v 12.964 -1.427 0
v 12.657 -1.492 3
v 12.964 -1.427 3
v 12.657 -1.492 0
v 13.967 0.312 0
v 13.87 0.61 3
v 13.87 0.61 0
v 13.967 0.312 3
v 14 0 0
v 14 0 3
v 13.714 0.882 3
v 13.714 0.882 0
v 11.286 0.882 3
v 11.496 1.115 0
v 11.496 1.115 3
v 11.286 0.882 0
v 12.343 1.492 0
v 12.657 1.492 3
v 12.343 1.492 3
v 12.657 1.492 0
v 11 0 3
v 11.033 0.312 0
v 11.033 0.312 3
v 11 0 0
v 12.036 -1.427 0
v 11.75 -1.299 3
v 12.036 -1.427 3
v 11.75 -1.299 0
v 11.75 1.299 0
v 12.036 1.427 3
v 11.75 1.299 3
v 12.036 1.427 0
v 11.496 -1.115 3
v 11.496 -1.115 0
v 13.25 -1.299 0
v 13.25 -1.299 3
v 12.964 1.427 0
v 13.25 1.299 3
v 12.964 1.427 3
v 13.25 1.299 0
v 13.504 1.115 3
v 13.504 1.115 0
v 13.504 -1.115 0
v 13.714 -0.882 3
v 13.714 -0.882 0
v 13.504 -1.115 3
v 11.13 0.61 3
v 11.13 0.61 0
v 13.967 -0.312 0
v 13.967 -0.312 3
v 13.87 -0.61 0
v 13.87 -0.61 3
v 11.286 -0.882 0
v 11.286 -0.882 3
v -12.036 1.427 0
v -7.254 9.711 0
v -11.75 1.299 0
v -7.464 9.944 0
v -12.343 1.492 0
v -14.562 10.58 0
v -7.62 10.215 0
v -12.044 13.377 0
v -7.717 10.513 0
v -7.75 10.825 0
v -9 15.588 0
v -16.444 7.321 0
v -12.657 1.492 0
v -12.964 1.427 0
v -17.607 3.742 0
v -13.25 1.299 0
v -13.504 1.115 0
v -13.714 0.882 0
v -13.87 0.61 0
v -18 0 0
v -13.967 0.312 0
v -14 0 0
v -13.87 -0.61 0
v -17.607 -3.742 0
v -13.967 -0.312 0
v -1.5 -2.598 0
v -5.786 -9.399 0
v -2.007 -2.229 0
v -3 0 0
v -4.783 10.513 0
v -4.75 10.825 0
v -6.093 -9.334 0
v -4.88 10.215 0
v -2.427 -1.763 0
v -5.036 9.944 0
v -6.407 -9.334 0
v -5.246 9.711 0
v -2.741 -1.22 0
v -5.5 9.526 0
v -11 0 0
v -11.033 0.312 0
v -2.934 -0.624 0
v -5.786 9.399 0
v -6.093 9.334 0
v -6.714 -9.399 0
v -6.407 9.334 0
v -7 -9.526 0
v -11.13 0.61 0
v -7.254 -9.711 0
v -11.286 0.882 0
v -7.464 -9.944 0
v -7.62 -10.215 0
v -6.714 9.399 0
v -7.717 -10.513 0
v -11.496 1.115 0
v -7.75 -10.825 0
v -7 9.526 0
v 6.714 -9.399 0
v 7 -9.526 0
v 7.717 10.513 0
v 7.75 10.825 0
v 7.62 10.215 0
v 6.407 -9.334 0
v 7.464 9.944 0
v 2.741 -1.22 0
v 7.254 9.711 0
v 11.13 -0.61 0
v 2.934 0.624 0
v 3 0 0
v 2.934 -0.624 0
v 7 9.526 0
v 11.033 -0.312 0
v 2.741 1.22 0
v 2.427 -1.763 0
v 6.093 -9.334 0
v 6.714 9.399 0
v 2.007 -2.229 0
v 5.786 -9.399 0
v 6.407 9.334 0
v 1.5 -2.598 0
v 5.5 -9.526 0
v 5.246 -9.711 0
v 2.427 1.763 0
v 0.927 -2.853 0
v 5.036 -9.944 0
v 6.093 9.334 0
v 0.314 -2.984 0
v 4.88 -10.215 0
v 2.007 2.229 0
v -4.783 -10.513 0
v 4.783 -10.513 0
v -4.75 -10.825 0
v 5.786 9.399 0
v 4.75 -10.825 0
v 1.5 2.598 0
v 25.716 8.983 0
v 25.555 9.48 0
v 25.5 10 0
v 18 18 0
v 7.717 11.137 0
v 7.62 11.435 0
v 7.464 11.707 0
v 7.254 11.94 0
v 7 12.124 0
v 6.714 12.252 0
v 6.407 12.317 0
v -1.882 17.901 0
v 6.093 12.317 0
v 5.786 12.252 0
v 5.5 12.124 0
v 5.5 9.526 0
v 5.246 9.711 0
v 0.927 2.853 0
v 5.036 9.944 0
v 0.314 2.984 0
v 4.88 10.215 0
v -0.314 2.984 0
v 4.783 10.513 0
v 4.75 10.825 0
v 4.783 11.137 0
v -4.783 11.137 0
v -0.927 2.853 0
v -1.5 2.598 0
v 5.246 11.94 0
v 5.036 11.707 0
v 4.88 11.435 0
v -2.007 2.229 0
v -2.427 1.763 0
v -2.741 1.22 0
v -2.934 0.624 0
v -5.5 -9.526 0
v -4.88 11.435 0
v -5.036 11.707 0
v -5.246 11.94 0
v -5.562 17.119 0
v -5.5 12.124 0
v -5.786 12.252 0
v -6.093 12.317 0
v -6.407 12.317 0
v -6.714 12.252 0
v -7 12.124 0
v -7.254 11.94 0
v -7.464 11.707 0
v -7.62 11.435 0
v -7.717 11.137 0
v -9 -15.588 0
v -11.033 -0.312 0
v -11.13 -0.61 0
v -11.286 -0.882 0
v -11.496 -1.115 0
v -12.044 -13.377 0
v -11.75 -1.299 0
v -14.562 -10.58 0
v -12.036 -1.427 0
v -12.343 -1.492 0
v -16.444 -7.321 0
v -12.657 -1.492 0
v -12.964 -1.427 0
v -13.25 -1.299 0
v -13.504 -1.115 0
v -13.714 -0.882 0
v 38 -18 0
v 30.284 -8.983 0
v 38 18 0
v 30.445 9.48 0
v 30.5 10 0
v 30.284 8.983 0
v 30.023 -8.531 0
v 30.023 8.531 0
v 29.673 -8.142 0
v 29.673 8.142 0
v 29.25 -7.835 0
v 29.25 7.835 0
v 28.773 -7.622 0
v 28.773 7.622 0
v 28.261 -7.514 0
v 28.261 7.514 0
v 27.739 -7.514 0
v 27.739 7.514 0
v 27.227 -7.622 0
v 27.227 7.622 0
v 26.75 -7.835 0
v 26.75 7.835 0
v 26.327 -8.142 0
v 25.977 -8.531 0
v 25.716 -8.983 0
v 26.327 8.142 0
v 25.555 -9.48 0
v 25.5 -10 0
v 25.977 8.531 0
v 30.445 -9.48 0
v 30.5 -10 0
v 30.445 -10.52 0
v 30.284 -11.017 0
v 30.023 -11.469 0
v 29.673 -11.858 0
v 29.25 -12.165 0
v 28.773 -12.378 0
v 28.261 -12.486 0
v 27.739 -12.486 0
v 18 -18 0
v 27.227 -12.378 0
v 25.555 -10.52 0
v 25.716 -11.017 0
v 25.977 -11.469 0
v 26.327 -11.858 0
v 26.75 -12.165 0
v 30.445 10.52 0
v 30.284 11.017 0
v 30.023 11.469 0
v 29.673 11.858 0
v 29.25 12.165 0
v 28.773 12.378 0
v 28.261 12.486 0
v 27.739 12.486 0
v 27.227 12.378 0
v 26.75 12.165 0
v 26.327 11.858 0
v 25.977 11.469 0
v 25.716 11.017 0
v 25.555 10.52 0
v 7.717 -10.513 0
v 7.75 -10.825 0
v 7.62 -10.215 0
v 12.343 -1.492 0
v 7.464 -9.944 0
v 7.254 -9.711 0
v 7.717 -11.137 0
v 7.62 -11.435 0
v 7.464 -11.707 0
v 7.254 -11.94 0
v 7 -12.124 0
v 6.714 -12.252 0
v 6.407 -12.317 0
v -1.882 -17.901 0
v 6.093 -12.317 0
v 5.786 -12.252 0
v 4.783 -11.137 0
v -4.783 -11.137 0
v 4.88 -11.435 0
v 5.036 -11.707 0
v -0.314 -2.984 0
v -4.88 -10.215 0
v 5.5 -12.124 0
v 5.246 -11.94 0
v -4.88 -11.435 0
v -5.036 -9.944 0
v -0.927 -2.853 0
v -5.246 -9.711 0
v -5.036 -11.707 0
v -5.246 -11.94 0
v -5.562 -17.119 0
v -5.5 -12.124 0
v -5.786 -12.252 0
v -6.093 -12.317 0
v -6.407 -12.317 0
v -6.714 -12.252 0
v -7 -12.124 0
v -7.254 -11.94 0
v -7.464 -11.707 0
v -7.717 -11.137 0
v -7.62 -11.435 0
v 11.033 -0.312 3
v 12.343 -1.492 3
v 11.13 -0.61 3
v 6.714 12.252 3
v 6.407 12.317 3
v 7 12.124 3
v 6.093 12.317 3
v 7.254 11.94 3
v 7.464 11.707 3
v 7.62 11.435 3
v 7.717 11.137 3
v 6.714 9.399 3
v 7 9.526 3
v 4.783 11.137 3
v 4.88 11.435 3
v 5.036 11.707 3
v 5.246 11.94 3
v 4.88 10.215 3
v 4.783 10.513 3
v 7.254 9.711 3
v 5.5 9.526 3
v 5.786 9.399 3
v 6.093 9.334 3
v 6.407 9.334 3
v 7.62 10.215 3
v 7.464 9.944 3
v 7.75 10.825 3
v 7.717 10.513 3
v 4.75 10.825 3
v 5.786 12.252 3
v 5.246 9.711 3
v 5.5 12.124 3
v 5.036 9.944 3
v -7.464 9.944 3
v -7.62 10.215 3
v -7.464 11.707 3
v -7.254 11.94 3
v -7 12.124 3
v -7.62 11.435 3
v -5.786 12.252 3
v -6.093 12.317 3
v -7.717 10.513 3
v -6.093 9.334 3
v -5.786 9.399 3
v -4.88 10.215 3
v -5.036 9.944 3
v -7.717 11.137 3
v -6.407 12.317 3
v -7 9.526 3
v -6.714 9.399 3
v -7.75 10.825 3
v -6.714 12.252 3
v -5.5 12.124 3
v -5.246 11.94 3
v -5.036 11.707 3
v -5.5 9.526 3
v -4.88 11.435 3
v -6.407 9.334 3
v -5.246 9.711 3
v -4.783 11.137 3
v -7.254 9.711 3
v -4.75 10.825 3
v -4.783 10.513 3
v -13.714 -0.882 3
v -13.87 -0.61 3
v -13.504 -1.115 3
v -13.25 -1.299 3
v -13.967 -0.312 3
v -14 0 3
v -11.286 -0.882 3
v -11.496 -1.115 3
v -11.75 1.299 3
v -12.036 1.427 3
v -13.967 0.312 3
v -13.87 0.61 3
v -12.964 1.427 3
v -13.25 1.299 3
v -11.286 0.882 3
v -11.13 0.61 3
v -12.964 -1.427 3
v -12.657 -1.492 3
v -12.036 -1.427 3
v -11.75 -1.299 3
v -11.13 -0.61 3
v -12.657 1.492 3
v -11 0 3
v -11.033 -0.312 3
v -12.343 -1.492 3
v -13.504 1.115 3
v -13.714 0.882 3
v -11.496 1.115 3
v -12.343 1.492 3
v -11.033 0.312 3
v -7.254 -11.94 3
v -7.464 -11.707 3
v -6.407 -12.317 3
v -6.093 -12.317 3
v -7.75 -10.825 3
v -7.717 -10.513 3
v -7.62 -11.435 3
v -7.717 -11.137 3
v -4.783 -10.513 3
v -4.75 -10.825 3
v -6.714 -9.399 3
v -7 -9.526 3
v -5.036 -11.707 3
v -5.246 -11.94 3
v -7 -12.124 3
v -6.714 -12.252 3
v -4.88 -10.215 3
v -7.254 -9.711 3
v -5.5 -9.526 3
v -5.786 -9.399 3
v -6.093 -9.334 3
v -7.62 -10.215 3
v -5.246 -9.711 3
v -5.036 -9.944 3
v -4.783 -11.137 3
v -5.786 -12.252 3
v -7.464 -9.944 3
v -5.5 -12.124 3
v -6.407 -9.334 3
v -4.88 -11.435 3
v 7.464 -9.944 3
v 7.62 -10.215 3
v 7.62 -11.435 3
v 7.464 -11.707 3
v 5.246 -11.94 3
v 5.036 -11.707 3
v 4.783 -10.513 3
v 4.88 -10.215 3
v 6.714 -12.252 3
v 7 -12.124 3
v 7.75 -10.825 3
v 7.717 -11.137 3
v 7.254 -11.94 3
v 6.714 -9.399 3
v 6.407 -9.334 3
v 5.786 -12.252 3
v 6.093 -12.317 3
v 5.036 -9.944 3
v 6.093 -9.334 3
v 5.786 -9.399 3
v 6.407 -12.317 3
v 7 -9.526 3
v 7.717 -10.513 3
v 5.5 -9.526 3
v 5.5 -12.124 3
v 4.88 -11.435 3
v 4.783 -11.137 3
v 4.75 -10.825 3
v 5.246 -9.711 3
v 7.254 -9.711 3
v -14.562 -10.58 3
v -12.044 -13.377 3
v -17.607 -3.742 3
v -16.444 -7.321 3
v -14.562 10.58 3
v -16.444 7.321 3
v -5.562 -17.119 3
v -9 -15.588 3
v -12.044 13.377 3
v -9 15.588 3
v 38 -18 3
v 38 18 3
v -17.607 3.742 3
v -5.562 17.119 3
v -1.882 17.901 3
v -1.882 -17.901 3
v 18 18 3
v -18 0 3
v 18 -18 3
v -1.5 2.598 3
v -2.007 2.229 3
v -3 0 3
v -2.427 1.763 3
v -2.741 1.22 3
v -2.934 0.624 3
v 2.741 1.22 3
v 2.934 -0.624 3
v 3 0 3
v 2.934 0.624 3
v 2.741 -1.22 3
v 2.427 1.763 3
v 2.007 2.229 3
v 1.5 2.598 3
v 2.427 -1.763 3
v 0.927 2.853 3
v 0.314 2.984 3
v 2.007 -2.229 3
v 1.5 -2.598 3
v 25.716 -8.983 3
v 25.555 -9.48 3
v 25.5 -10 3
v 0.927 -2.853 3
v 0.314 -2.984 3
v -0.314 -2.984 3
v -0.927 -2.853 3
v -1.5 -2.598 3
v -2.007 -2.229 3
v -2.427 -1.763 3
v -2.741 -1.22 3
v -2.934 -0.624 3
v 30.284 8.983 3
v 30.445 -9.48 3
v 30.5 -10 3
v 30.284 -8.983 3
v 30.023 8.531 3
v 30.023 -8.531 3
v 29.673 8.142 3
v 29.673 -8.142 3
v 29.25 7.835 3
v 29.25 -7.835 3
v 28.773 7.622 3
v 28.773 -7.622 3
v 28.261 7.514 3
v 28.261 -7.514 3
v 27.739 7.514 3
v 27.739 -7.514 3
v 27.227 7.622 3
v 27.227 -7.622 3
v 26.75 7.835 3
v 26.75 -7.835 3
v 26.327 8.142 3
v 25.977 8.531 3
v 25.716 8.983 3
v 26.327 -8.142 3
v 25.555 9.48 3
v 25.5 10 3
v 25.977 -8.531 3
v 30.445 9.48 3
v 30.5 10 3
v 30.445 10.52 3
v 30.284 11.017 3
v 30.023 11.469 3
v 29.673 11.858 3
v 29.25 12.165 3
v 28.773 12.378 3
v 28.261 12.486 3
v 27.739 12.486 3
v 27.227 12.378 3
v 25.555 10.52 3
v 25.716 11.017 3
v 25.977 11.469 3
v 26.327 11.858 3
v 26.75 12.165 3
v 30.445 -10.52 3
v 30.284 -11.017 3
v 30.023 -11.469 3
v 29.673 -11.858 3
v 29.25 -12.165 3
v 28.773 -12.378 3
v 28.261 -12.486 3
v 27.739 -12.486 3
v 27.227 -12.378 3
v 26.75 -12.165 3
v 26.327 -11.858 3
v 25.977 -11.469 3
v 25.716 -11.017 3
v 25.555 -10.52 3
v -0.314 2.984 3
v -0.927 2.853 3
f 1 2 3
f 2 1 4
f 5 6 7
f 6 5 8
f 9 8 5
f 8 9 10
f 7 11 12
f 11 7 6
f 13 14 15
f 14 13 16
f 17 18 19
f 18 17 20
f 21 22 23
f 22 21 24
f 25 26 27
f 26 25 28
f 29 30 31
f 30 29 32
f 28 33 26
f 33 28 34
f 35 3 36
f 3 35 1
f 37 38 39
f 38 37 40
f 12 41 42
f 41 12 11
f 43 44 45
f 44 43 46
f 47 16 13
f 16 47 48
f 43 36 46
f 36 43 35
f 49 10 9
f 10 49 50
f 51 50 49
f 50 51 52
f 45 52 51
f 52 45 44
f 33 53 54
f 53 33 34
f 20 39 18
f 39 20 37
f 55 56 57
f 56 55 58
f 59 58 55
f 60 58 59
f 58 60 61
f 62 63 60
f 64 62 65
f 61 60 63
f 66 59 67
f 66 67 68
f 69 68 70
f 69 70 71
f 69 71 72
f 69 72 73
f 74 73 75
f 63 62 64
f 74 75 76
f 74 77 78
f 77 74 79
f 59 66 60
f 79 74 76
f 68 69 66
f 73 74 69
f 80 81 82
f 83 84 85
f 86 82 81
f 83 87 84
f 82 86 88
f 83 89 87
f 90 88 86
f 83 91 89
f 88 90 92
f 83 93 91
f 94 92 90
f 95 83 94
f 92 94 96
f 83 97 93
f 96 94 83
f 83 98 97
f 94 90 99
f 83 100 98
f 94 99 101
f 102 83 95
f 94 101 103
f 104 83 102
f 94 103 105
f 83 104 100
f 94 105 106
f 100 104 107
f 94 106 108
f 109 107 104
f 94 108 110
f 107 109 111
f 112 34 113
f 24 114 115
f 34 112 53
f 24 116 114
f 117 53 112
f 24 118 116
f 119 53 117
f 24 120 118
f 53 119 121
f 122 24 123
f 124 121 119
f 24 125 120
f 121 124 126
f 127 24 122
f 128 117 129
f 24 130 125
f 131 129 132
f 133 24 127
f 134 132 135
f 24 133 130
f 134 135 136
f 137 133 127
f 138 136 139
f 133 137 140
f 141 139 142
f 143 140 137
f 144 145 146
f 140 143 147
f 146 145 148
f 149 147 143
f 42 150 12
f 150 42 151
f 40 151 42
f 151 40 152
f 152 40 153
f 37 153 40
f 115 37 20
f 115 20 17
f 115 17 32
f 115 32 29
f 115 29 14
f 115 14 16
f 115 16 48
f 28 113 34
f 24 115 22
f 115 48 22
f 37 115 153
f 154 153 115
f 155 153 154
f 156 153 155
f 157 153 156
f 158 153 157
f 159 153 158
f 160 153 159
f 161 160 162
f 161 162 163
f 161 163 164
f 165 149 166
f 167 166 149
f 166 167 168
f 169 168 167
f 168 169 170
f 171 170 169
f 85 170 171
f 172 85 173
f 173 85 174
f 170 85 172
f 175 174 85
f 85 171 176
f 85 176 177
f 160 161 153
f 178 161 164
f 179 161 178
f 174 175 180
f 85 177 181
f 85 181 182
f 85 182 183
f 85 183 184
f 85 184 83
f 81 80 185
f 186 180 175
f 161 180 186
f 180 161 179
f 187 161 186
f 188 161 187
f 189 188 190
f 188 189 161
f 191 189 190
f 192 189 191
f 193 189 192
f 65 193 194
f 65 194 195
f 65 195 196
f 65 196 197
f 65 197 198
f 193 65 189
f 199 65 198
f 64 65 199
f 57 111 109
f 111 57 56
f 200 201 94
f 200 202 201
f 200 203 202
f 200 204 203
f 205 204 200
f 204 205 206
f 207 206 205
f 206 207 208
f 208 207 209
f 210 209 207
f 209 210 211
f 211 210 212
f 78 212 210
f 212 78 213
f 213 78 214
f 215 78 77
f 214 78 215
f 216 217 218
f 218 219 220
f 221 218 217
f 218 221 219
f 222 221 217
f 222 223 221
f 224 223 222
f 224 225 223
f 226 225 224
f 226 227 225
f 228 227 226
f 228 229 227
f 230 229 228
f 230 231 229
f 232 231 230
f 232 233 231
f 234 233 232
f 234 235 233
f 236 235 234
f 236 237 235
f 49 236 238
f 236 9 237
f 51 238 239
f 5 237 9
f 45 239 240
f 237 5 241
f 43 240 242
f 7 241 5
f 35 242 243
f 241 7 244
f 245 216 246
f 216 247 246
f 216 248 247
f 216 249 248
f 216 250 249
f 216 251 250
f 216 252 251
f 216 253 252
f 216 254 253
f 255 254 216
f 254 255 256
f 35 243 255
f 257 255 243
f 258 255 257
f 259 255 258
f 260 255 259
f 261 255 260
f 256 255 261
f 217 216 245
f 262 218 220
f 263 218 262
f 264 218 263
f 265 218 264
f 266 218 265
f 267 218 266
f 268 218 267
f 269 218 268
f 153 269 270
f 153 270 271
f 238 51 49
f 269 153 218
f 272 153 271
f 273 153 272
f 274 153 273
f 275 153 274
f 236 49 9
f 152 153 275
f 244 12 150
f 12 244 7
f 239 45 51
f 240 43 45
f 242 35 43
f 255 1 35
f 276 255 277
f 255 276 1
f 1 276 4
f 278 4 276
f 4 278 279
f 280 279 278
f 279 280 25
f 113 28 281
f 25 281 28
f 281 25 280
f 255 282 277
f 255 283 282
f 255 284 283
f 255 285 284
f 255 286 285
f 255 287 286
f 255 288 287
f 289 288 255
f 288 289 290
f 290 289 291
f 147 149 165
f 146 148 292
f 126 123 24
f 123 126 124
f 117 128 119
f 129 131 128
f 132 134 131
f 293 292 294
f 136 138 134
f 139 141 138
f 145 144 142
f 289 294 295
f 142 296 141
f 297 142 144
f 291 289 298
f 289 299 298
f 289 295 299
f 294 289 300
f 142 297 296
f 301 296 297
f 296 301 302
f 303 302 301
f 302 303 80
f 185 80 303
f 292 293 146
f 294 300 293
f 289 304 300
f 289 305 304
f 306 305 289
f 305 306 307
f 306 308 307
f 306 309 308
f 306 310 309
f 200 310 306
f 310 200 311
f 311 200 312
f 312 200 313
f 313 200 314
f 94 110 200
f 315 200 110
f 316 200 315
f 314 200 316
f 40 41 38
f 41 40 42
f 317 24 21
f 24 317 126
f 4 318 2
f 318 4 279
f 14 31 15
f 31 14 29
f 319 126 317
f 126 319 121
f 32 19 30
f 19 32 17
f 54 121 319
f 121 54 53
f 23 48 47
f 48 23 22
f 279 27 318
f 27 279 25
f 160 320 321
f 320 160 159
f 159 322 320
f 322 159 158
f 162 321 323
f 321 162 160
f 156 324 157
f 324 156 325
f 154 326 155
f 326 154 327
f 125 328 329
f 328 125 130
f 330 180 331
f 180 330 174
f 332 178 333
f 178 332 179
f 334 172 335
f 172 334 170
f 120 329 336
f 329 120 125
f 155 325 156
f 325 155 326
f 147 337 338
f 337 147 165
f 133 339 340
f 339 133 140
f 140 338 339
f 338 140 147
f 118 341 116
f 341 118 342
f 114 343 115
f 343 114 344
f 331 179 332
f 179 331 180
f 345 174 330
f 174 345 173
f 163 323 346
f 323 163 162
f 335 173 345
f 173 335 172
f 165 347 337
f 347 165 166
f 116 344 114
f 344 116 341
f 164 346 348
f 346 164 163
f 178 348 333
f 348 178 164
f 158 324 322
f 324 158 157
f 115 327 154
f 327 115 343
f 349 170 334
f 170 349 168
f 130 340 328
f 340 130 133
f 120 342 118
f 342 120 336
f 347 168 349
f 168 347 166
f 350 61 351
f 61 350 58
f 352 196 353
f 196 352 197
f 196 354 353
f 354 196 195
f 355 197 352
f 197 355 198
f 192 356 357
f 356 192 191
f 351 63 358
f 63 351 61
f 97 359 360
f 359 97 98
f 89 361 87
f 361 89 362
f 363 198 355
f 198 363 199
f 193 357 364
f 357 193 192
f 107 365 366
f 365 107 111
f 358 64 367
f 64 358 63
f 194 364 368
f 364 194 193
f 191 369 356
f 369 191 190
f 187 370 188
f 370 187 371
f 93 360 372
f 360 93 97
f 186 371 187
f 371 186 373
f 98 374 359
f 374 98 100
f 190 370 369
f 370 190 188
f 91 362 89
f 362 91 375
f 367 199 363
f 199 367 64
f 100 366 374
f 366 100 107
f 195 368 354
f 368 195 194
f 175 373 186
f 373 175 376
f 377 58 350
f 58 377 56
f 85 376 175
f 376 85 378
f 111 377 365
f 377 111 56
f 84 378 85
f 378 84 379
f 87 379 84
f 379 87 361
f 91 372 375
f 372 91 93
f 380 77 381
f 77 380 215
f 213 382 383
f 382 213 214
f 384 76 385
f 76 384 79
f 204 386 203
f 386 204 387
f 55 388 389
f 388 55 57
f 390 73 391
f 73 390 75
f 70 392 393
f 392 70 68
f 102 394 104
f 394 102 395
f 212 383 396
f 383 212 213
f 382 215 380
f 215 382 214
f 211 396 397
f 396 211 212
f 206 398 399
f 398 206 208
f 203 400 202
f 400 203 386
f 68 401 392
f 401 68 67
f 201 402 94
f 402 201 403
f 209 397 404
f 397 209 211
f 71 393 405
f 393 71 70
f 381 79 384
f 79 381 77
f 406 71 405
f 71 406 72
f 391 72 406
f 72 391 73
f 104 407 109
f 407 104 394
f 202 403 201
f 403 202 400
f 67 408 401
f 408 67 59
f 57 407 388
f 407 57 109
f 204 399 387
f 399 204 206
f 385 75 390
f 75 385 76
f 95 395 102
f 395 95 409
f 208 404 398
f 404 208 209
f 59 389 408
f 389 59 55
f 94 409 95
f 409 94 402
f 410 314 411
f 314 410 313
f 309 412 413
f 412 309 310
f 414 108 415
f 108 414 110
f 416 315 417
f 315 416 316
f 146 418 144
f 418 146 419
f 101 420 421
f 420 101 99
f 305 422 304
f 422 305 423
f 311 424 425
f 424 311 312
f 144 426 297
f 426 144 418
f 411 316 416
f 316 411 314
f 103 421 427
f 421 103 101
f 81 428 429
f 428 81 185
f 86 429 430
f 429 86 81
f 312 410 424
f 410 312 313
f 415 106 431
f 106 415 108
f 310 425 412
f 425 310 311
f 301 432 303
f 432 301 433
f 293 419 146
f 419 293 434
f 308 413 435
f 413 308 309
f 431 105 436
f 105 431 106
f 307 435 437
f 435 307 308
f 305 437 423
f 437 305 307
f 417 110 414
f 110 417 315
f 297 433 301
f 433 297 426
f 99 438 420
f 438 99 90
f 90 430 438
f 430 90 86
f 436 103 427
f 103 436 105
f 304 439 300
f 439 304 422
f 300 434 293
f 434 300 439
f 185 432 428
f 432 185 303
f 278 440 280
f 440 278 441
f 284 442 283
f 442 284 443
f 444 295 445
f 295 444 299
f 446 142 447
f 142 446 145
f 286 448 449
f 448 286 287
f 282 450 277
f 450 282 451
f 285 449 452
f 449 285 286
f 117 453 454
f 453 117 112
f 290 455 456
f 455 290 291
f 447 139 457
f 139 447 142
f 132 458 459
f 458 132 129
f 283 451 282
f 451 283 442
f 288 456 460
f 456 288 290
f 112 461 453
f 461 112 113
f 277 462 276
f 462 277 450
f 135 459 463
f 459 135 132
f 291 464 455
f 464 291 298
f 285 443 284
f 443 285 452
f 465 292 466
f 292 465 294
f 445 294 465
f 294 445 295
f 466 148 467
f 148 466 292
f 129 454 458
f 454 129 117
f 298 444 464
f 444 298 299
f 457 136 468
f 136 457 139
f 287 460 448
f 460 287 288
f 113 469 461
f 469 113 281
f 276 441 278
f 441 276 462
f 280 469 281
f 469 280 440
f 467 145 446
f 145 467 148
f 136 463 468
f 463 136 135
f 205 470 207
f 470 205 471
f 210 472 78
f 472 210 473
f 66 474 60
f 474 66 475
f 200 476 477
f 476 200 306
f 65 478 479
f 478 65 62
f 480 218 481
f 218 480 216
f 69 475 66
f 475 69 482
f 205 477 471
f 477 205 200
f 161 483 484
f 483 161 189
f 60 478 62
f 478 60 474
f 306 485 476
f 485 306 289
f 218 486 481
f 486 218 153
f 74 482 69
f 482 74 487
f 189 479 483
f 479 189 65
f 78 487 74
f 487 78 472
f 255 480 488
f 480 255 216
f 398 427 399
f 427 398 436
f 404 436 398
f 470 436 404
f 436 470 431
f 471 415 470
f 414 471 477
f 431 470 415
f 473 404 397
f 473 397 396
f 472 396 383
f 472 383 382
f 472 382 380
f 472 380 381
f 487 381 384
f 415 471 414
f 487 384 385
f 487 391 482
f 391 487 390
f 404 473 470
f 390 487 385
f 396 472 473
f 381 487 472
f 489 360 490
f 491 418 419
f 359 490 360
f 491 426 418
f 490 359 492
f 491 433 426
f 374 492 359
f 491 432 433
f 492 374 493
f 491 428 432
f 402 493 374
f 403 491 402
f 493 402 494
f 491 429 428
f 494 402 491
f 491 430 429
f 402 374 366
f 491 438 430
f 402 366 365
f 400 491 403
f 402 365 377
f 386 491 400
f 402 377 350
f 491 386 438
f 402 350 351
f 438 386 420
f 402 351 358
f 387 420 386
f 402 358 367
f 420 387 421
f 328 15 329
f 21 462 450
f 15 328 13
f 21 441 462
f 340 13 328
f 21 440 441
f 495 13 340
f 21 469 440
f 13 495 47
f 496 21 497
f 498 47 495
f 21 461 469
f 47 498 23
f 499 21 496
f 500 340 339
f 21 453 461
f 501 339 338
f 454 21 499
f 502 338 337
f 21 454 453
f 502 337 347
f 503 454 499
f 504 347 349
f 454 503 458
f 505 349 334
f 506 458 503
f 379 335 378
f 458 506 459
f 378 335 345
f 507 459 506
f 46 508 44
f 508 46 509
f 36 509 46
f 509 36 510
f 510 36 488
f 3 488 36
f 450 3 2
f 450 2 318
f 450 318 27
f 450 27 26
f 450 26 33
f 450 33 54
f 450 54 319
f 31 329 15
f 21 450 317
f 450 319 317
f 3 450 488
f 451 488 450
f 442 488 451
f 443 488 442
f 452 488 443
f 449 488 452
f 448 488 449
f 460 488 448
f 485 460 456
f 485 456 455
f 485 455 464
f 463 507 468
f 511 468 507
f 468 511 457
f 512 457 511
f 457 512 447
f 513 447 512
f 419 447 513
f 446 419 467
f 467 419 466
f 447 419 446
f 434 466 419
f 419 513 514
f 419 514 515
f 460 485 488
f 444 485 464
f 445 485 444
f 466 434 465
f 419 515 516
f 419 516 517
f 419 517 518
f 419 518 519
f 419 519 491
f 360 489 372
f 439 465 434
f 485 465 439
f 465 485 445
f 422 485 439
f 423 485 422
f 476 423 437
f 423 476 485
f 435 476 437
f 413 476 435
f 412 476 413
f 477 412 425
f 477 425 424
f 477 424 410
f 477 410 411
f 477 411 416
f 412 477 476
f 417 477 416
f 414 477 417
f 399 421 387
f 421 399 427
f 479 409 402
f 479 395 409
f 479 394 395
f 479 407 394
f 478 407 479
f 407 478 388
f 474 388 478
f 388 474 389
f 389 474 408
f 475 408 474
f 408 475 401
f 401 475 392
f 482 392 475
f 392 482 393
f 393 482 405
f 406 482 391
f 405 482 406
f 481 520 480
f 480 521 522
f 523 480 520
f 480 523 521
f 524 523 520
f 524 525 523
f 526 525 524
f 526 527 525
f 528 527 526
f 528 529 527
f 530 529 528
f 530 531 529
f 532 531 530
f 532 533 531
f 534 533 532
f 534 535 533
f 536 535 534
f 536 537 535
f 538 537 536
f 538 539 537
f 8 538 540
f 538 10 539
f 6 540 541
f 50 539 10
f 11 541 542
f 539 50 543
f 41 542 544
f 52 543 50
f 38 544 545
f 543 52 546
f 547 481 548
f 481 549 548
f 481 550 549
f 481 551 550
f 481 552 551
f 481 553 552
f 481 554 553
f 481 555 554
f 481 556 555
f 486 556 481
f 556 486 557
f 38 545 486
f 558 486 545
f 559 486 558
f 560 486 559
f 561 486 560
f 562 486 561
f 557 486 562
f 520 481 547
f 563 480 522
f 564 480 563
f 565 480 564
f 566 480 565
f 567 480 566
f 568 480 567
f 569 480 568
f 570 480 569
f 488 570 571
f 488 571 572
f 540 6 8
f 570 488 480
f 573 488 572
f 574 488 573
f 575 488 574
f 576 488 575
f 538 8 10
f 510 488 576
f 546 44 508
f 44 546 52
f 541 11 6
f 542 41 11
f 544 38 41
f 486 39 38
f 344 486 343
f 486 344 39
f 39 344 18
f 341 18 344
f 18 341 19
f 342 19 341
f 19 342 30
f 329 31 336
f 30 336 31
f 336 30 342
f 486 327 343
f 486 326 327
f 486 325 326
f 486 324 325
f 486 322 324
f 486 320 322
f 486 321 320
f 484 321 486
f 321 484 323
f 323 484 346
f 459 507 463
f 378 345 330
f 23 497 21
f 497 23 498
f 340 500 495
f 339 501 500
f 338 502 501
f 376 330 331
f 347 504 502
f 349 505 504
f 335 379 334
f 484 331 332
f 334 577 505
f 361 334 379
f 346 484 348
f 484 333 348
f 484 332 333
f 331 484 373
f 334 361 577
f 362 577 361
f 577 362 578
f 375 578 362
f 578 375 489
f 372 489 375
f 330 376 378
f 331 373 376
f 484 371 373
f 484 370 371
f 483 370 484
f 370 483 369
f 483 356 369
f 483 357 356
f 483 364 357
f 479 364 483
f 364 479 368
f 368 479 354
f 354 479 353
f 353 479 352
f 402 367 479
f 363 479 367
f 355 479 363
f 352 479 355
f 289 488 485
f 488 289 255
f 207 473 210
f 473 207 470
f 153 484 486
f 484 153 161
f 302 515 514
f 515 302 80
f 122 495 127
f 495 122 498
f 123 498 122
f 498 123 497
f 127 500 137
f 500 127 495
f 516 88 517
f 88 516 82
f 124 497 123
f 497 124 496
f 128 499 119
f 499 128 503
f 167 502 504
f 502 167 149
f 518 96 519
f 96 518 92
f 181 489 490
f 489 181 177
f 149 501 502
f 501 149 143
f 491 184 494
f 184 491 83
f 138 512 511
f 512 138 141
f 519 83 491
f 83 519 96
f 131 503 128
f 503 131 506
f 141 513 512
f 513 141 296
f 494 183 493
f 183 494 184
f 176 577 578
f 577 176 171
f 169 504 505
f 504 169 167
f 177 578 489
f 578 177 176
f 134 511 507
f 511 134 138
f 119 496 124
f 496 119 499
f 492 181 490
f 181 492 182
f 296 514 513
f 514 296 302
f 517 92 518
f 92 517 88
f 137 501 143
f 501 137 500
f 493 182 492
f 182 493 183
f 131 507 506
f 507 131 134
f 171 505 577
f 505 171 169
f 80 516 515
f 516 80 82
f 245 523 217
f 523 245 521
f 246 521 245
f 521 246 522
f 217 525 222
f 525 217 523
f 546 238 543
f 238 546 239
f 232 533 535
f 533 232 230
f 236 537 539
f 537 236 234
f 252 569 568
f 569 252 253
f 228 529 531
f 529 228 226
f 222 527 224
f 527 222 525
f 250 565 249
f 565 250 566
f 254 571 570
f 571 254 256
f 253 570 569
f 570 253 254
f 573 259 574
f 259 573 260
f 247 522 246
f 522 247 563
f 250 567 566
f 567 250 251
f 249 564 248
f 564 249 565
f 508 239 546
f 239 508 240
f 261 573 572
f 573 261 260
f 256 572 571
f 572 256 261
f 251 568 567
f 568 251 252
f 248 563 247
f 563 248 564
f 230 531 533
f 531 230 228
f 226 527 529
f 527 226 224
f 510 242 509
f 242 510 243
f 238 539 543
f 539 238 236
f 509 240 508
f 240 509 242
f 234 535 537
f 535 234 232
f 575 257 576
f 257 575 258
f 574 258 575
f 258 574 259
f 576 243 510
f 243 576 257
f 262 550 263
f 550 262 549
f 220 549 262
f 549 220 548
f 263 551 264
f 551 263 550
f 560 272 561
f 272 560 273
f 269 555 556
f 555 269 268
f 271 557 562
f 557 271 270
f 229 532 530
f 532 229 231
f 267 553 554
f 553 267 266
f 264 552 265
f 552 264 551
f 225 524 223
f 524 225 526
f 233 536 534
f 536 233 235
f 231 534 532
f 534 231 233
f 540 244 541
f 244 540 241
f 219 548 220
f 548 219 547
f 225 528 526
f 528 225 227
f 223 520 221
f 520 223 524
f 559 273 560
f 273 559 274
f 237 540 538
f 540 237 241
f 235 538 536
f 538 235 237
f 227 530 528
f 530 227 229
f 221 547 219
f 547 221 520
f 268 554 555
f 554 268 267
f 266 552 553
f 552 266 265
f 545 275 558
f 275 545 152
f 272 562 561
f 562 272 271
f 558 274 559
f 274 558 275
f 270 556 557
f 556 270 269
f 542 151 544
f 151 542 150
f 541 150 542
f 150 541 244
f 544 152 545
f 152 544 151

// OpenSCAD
$fn=30;
thickness=3;
motor_diameter=36;
extrusion = 20;

difference(){
    hull(){
    translate([motor_diameter/2,-motor_diameter/2,0])
cube([extrusion, motor_diameter, thickness]);
   
cylinder(r=motor_diameter/2,h=thickness); }
for(counter = [0 : 5]){
rotate(60*counter)
translate([25/2,0,0]) cylinder(r=1.5,h=10);
};
cylinder(r=3,h=10);

translate([motor_diameter/2+extrusion/2,-motor_diameter/2+8,0])
cylinder(r=2.5,h=10);

translate([motor_diameter/2+extrusion/2,motor_diameter/2-8,0])
cylinder(r=2.5,h=10);


};
